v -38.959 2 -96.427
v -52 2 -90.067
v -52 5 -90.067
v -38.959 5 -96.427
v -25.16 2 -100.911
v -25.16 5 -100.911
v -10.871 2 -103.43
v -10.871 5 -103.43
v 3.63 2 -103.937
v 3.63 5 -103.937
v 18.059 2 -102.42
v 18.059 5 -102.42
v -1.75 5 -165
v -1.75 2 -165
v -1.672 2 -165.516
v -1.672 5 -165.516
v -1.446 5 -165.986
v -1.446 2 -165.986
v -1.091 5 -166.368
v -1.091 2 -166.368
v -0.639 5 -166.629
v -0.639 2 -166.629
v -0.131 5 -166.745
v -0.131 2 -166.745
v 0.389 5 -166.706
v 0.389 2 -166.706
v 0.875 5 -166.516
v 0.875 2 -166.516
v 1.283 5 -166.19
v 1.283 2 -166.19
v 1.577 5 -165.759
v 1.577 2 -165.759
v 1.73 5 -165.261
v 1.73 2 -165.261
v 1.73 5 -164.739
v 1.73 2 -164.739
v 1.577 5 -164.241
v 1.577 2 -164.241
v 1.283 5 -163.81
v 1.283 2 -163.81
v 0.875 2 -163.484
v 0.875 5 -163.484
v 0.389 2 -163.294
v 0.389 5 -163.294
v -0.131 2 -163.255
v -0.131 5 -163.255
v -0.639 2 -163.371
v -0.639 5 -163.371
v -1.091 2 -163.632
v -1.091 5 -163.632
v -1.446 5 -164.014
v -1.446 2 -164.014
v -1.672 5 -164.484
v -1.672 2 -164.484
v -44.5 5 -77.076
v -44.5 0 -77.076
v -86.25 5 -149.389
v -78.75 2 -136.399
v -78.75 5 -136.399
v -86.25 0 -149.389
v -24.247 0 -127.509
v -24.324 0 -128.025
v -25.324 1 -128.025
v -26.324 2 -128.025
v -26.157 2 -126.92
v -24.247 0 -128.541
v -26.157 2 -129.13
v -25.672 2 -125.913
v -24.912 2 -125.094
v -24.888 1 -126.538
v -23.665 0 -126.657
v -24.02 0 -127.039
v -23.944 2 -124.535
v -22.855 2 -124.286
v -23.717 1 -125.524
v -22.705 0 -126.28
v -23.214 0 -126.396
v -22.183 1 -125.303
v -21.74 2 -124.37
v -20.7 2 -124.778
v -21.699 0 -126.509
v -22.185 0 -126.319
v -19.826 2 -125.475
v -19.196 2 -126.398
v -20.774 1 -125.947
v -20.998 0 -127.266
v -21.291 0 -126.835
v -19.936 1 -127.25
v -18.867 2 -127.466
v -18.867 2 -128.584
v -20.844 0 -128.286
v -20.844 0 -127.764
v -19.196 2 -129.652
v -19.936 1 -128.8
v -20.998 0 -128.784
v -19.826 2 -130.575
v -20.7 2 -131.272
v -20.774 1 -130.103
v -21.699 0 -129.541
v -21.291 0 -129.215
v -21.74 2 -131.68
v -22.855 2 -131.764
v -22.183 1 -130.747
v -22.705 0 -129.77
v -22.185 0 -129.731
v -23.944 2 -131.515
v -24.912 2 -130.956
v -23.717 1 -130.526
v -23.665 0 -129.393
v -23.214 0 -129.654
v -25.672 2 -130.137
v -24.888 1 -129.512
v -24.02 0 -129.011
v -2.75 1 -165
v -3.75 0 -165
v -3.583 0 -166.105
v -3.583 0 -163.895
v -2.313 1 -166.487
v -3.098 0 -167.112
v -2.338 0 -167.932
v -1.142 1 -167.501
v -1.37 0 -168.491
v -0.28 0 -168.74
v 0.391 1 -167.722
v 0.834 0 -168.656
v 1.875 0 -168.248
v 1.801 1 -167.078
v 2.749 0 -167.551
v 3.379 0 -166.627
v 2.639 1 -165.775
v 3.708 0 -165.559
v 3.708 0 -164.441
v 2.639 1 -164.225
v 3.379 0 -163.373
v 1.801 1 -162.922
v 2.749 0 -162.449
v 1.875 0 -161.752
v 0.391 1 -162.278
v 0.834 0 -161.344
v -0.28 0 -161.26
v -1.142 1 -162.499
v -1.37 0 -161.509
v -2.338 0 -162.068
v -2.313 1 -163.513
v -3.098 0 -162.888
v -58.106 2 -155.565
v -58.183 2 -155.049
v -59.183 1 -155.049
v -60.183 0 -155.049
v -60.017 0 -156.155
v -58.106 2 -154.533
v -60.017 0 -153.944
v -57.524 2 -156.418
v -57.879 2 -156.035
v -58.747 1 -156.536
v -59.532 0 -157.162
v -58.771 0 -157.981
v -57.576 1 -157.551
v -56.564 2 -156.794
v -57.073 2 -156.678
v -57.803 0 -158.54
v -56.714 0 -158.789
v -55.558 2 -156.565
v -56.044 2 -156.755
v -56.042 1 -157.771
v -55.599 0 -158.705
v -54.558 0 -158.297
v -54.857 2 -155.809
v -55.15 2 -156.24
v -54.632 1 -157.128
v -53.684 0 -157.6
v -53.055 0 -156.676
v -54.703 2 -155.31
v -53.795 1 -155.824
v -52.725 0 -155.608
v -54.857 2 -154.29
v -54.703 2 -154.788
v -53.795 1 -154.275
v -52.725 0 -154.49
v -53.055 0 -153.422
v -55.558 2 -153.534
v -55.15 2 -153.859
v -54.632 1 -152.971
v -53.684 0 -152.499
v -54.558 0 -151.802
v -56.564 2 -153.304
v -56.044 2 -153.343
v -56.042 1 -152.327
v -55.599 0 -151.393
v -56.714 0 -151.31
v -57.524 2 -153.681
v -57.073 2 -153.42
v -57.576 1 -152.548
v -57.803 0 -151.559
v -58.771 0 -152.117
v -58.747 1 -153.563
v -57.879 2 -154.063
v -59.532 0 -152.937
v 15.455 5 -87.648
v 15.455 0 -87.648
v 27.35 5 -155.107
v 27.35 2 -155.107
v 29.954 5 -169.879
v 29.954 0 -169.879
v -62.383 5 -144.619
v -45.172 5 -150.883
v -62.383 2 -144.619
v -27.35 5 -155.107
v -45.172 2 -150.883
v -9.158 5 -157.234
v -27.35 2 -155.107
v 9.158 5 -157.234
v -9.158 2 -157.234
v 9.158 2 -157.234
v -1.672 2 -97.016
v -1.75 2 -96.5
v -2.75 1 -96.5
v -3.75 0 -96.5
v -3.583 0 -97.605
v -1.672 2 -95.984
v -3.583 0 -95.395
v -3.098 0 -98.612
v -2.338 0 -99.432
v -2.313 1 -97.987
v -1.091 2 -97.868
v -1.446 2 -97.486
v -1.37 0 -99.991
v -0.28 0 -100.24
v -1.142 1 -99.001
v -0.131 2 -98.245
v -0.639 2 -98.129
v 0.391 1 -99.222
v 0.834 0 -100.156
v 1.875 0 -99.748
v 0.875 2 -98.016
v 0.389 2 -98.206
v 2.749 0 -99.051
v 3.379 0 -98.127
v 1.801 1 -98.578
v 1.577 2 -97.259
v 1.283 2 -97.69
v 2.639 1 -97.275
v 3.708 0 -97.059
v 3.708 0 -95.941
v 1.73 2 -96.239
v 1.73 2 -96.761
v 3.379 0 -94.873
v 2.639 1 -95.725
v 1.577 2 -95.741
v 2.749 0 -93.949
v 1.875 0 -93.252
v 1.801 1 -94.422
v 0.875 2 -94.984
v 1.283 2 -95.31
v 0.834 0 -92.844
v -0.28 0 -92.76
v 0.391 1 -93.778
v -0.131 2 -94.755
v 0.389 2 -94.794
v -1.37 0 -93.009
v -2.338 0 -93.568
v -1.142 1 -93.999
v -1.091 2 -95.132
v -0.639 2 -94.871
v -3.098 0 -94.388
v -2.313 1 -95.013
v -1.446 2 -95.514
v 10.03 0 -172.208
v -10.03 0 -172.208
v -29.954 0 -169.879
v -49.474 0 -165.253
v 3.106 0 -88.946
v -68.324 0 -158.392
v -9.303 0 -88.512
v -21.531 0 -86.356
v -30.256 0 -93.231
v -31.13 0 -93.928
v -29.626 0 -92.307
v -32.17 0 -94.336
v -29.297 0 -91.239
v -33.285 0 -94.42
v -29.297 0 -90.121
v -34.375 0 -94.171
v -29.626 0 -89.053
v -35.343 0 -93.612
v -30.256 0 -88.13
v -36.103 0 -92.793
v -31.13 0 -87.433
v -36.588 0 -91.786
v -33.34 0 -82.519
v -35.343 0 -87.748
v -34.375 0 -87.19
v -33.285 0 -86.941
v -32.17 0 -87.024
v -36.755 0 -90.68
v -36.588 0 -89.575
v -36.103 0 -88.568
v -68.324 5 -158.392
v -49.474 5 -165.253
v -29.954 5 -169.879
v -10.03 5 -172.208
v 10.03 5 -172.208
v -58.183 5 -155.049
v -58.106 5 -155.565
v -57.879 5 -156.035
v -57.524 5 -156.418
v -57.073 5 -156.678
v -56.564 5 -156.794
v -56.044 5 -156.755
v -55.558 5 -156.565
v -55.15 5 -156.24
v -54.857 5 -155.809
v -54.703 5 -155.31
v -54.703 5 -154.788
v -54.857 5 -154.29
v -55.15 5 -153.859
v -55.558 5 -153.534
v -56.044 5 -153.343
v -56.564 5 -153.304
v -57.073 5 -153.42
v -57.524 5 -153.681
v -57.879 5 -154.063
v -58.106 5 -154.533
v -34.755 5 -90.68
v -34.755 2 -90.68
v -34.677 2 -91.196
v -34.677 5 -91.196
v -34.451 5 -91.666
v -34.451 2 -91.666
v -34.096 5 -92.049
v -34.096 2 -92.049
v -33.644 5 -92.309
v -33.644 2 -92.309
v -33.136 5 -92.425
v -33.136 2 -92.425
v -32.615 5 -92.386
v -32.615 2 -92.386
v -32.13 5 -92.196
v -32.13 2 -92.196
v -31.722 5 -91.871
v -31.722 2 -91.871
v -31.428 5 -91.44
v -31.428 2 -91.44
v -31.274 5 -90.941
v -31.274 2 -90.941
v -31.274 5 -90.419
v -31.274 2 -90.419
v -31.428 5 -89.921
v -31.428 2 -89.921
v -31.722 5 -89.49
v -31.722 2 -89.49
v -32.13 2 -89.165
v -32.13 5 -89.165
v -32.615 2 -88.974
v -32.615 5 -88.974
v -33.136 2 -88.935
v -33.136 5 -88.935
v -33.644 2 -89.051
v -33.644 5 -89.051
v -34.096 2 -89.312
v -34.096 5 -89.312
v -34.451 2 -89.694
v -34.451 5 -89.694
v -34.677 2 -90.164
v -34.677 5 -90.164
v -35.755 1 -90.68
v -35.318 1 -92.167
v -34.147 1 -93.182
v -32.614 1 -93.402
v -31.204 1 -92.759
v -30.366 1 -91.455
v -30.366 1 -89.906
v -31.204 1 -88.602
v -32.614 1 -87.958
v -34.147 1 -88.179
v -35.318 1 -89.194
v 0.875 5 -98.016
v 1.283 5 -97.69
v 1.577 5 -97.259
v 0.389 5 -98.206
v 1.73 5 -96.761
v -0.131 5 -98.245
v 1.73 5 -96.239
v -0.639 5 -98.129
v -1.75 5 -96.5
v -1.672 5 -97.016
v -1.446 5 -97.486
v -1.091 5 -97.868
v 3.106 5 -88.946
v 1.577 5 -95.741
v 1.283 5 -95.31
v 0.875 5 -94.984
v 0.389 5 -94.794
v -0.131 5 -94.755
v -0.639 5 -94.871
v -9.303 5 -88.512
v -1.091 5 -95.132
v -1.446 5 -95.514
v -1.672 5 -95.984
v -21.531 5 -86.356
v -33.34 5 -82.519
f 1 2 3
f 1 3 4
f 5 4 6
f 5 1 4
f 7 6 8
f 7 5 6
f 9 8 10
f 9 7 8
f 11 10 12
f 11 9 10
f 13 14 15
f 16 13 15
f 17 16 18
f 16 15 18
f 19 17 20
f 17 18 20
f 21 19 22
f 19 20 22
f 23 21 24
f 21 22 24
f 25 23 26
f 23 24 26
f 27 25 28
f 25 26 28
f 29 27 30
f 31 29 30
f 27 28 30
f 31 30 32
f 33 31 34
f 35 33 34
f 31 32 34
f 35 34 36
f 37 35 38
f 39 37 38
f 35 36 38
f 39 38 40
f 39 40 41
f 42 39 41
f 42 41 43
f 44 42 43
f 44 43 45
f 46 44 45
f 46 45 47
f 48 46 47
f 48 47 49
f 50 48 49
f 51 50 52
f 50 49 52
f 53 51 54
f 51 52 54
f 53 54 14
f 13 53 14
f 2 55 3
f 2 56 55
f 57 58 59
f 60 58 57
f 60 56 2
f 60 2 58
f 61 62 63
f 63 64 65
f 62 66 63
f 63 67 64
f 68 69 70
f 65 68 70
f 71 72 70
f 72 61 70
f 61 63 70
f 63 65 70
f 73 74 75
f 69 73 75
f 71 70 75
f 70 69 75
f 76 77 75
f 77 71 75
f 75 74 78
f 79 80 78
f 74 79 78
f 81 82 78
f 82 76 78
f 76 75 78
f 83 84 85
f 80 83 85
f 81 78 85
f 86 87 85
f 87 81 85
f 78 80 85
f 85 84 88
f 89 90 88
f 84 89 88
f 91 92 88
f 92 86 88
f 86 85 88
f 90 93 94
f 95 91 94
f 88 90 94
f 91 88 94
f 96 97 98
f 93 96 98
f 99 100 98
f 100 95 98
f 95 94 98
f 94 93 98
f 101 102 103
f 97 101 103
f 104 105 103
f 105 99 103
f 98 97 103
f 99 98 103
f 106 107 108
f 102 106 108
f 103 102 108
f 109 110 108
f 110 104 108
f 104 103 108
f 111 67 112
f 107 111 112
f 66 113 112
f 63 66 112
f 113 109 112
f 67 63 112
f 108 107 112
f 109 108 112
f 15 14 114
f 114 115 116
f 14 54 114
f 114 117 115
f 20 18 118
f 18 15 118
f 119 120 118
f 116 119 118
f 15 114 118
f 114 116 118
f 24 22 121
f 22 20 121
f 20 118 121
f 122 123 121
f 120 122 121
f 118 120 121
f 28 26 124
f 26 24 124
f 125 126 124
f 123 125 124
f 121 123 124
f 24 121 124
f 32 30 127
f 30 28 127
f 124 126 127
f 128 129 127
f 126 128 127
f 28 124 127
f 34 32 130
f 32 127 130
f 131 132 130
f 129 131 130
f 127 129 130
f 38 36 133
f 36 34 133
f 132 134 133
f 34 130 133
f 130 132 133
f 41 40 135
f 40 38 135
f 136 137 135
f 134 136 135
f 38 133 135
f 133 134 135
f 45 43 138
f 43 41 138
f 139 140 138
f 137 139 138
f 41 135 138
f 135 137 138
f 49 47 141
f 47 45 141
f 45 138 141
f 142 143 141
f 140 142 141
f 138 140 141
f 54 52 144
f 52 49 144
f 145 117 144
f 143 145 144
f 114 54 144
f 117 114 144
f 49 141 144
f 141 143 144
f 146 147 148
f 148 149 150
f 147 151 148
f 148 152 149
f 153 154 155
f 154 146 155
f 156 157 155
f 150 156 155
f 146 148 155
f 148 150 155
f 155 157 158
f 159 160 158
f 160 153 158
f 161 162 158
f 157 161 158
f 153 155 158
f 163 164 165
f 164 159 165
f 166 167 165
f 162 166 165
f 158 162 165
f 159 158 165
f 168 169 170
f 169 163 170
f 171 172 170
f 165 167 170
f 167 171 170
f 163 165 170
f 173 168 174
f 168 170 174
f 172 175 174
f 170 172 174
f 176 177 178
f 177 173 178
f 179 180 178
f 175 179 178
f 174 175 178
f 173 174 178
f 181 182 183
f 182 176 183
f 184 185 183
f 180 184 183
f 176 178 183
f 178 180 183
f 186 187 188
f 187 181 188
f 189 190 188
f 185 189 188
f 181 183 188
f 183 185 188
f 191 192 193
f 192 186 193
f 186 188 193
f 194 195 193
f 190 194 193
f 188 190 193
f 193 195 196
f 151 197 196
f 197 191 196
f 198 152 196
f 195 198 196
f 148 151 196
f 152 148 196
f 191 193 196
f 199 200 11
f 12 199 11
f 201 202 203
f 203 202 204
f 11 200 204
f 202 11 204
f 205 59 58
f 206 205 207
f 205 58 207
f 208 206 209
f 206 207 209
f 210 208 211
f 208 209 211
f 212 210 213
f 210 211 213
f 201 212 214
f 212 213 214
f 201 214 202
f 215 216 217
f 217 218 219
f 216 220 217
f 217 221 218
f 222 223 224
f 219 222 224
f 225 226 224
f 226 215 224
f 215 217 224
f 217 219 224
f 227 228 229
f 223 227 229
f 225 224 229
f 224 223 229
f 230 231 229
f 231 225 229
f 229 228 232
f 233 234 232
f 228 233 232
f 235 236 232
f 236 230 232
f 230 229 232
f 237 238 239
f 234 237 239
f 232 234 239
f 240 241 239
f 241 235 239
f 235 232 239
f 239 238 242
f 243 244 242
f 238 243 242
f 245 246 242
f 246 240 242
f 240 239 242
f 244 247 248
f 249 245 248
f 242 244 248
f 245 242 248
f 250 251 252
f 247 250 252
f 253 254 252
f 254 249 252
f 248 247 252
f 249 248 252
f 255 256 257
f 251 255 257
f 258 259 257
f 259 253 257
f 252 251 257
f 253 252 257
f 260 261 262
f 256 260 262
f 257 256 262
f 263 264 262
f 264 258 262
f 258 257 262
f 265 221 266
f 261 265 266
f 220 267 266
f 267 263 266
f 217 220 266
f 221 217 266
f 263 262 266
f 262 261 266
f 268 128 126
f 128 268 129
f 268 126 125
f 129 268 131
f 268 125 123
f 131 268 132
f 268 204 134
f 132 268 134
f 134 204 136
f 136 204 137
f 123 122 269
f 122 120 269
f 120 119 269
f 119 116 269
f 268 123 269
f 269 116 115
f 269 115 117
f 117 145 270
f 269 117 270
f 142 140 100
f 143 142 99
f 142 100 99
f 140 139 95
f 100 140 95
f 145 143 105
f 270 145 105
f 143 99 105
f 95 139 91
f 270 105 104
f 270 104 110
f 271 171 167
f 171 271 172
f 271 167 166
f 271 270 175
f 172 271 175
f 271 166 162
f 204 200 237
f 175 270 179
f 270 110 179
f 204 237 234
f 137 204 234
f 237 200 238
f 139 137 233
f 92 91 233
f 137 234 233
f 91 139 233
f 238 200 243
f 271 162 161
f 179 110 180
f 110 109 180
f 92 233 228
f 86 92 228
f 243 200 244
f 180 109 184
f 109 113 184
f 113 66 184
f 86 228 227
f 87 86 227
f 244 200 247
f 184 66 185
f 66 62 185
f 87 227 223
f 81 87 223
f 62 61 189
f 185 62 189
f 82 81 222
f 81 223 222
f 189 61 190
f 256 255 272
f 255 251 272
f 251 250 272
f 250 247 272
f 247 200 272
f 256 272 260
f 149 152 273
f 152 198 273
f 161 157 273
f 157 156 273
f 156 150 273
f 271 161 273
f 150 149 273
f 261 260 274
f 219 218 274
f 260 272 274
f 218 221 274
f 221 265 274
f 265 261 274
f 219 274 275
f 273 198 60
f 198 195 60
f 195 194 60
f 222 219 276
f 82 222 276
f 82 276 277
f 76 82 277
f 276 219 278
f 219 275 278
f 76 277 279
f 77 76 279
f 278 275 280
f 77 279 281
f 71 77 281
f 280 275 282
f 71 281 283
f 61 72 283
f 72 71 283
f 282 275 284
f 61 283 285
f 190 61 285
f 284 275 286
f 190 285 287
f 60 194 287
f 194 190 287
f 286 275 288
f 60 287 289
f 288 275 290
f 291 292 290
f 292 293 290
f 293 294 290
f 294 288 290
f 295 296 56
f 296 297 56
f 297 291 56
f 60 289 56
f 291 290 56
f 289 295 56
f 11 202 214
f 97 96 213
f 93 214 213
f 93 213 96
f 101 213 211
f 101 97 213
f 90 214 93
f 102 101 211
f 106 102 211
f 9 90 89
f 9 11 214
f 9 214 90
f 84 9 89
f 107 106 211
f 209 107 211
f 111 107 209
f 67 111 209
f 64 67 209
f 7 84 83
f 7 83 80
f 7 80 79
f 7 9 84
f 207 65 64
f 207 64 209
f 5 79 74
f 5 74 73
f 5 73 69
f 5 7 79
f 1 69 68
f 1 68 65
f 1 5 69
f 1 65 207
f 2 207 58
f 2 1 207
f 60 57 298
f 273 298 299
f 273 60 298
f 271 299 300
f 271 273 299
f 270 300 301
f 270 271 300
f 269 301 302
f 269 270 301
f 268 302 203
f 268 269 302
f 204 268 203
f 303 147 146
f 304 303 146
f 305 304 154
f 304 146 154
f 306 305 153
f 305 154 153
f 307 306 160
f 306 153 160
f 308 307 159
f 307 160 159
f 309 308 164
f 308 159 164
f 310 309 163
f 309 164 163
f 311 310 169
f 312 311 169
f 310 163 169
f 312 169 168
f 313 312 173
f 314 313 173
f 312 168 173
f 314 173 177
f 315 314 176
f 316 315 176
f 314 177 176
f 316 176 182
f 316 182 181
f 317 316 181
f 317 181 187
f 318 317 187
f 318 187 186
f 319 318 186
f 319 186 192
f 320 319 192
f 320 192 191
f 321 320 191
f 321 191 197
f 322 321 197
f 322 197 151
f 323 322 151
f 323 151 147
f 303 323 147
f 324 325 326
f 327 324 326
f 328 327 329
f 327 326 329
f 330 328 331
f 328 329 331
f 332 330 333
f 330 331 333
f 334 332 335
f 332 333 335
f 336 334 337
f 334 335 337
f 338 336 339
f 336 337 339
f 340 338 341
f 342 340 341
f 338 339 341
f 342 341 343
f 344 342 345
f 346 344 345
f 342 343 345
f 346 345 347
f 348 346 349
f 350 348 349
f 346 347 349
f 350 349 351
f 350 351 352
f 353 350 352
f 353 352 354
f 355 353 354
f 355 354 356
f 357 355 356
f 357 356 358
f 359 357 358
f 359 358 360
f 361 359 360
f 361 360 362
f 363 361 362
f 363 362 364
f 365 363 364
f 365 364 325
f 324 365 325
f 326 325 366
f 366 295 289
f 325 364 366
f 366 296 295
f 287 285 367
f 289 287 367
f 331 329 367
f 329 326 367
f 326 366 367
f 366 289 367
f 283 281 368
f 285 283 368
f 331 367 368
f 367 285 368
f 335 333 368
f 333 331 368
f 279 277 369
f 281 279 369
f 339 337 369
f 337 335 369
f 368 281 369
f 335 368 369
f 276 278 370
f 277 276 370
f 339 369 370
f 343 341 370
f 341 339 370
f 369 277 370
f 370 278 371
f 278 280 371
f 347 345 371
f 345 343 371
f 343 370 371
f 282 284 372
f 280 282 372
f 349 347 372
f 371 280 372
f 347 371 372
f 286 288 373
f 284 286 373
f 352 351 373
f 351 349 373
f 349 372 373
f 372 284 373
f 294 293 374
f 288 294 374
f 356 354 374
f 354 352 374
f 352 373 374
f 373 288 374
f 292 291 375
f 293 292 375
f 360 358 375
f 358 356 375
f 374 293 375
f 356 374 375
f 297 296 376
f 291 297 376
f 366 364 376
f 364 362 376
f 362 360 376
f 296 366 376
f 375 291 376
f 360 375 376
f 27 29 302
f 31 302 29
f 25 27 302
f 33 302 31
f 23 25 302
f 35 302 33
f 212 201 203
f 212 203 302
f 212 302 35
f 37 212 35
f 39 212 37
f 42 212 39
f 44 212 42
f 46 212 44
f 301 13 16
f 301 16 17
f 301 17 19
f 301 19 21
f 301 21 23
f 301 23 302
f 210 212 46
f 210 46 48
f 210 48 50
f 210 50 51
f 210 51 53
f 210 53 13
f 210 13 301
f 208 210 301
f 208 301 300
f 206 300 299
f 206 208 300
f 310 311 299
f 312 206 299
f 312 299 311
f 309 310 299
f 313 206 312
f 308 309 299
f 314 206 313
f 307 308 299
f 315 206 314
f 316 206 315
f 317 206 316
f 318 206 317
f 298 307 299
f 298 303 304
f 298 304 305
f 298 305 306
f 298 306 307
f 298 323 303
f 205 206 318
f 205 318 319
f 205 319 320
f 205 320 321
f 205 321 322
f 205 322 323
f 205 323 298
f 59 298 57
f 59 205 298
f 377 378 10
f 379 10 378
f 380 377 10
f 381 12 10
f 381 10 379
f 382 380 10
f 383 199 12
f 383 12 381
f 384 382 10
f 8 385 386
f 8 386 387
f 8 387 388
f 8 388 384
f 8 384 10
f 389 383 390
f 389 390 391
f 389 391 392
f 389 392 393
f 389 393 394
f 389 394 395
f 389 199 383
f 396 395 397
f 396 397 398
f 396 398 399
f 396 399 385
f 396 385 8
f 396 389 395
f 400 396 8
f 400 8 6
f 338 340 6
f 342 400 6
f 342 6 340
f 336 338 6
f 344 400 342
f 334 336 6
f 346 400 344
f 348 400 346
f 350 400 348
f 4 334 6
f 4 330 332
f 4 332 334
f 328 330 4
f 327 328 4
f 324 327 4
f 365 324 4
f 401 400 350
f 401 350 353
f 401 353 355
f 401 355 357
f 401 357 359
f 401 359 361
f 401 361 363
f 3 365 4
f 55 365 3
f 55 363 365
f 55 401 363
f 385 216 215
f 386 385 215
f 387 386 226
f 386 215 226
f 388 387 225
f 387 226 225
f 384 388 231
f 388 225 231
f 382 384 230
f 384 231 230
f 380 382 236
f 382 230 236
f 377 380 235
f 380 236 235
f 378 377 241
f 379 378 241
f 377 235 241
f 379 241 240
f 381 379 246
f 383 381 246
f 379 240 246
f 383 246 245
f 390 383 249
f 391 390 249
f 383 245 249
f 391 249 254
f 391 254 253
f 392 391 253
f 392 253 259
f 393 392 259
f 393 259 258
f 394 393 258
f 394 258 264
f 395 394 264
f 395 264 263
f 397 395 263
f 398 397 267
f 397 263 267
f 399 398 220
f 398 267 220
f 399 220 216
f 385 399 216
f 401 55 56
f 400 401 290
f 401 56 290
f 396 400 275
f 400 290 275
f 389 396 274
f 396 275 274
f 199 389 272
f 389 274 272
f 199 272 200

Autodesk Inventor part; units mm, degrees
ref_plane "YZ Plane" through (0, 0, 0) normal (1, 0, 0) x (0, 1, 0)
ref_plane "XZ Plane" through (0, 0, 0) normal (0, 1, 0) x (-1, 0, 0)
ref_plane "XY Plane" through (0, 0, 0) normal (0, 0, 1) x (1, 0, 0)
sketch "Sketch1" plane through (0, 0, 0) normal (0, 1, 0) x (-1, 0, 0)
  circle A0 centre (0, 0) radius 89 construction
  circle A1 centre (0, 0) radius 104 construction
  circle A2 centre (0, 0) radius 157.5 construction
  circle A3 centre (0, 0) radius 172.5 construction
  circle A4 centre (0, 0) radius 96.5 construction
  circle A5 centre (0, 0) radius 165 construction
  line L0 (0, 0) -> (0, -209.0924)
  line L1 (0, 0) -> (71.5138, -196.4826)
  line L2 (0, 0) -> (134.402, -160.1741)
  line L3 (0, 0) -> (181.0793, -104.5462)
  line L4 (0, 0) -> (205.9158, -36.3085)
  line L5 (0, 0) -> (205.9158, 36.3085)
  line L6 (0, 0) -> (181.0793, 104.5462)
  line L7 (0, 0) -> (134.402, 160.1741)
  line L8 (0, 0) -> (71.5138, 196.4826)
  line L9 (0, 0) -> (0, 209.0924)
  line L10 (0, 0) -> (-71.5138, 196.4826)
  line L11 (0, 0) -> (-134.402, 160.1741)
  line L12 (0, 0) -> (-181.0793, 104.5462)
  line L13 (0, 0) -> (-205.9158, 36.3085)
  line L14 (0, 0) -> (-205.9158, -36.3085)
  line L15 (0, 0) -> (-181.0793, -104.5462)
  line L16 (0, 0) -> (-134.402, -160.1741)
  line L17 (0, 0) -> (-71.5138, -196.4826)
  circle A6 centre (33.0049, -90.6803) radius 1.75
  circle A7 centre (56.4333, -155.0493) radius 1.75
  circle A8 centre (0, -96.5) radius 1.75
  circle A9 centre (0, -165) radius 1.75
  line L18 (0, 0) -> (86.25, -149.3894)
  line L19 (0, 0) -> (-29.9543, -169.8793)
  arc A10 (-29.9543, -169.8793) -> (86.25, -149.3894) centre (0, 0) ccw
  arc A11 (-15.4547, -87.6479) -> (44.5, -77.0763) centre (0, 0) ccw
  arc A12 (-18.0594, -102.42) -> (52, -90.0666) centre (0, 0) ccw
  arc A13 (-27.3496, -155.1072) -> (78.75, -136.399) centre (0, 0) ccw
  line L20 (0, 0) -> (25.4898, -144.5597)
  arc A14 (-8.5012, -129.7217) -> (33.7594, -125.5401) centre (0, 0) ccw
  circle A15 centre (22.5743, -128.025) radius 1.75
  dimension "d0" = 178
  dimension "d1" = 208
  dimension "d2" = 315
  dimension "d3" = 345
  dimension "d4" = 193
  dimension "d5" = 330
  dimension "d8" = 360
  dimension "d11" = 3.5
  dimension "d13" = 3.5
  dimension "d14" = 3.5
  dimension "d15" = 3.5
  dimension "d23" = 10
  dimension "d24" = 10
  dimension "d25" = 20
  dimension "d26" = 130
  dimension "d27" = 3.5
extrude "Extrusion1" add sketch "Sketch1" along normal blind 5 contours A11 L20 A12 L0 A8 | L0 A8 A12 L19 A11 | A11 L18 A12 L1 A6 | L1 A6 A12 L20 A11 | L18 A10 L1 A7 A13 | A13 L0 A9 A10 L19 | L1 A7 A10 L0 A9 A13
extrude "Extrusion2" add sketch "Sketch1" along normal blind 2 contours L18 A13 L1 A12 | A12 L0 A13 L19 | L20 A15 A14 L0 A12 | A12 L1 A13 L0 A14 A15 L20 | A15 A14 L20 | L20 A14 A15 | A14 A15 L20 | L20 A15 A14
chamfer "Chamfer1" distance 2 angle 45 4 edges at (1.75, 0, -96.5) (1.75, 0, -165) (-54.6833, 0, -155.0493) (-31.2549, 0, -90.6803)
extrude "Extrusion3" cut sketch "Sketch1" along normal through all contours A15 A14 L20 | L20 A14 A15 | A14 A15 L20 | L20 A15 A14
chamfer "Chamfer2" distance 2 angle 45 1 edges at (-20.8243, 2, -128.025)
properties part number "stator-bottom-connector"
